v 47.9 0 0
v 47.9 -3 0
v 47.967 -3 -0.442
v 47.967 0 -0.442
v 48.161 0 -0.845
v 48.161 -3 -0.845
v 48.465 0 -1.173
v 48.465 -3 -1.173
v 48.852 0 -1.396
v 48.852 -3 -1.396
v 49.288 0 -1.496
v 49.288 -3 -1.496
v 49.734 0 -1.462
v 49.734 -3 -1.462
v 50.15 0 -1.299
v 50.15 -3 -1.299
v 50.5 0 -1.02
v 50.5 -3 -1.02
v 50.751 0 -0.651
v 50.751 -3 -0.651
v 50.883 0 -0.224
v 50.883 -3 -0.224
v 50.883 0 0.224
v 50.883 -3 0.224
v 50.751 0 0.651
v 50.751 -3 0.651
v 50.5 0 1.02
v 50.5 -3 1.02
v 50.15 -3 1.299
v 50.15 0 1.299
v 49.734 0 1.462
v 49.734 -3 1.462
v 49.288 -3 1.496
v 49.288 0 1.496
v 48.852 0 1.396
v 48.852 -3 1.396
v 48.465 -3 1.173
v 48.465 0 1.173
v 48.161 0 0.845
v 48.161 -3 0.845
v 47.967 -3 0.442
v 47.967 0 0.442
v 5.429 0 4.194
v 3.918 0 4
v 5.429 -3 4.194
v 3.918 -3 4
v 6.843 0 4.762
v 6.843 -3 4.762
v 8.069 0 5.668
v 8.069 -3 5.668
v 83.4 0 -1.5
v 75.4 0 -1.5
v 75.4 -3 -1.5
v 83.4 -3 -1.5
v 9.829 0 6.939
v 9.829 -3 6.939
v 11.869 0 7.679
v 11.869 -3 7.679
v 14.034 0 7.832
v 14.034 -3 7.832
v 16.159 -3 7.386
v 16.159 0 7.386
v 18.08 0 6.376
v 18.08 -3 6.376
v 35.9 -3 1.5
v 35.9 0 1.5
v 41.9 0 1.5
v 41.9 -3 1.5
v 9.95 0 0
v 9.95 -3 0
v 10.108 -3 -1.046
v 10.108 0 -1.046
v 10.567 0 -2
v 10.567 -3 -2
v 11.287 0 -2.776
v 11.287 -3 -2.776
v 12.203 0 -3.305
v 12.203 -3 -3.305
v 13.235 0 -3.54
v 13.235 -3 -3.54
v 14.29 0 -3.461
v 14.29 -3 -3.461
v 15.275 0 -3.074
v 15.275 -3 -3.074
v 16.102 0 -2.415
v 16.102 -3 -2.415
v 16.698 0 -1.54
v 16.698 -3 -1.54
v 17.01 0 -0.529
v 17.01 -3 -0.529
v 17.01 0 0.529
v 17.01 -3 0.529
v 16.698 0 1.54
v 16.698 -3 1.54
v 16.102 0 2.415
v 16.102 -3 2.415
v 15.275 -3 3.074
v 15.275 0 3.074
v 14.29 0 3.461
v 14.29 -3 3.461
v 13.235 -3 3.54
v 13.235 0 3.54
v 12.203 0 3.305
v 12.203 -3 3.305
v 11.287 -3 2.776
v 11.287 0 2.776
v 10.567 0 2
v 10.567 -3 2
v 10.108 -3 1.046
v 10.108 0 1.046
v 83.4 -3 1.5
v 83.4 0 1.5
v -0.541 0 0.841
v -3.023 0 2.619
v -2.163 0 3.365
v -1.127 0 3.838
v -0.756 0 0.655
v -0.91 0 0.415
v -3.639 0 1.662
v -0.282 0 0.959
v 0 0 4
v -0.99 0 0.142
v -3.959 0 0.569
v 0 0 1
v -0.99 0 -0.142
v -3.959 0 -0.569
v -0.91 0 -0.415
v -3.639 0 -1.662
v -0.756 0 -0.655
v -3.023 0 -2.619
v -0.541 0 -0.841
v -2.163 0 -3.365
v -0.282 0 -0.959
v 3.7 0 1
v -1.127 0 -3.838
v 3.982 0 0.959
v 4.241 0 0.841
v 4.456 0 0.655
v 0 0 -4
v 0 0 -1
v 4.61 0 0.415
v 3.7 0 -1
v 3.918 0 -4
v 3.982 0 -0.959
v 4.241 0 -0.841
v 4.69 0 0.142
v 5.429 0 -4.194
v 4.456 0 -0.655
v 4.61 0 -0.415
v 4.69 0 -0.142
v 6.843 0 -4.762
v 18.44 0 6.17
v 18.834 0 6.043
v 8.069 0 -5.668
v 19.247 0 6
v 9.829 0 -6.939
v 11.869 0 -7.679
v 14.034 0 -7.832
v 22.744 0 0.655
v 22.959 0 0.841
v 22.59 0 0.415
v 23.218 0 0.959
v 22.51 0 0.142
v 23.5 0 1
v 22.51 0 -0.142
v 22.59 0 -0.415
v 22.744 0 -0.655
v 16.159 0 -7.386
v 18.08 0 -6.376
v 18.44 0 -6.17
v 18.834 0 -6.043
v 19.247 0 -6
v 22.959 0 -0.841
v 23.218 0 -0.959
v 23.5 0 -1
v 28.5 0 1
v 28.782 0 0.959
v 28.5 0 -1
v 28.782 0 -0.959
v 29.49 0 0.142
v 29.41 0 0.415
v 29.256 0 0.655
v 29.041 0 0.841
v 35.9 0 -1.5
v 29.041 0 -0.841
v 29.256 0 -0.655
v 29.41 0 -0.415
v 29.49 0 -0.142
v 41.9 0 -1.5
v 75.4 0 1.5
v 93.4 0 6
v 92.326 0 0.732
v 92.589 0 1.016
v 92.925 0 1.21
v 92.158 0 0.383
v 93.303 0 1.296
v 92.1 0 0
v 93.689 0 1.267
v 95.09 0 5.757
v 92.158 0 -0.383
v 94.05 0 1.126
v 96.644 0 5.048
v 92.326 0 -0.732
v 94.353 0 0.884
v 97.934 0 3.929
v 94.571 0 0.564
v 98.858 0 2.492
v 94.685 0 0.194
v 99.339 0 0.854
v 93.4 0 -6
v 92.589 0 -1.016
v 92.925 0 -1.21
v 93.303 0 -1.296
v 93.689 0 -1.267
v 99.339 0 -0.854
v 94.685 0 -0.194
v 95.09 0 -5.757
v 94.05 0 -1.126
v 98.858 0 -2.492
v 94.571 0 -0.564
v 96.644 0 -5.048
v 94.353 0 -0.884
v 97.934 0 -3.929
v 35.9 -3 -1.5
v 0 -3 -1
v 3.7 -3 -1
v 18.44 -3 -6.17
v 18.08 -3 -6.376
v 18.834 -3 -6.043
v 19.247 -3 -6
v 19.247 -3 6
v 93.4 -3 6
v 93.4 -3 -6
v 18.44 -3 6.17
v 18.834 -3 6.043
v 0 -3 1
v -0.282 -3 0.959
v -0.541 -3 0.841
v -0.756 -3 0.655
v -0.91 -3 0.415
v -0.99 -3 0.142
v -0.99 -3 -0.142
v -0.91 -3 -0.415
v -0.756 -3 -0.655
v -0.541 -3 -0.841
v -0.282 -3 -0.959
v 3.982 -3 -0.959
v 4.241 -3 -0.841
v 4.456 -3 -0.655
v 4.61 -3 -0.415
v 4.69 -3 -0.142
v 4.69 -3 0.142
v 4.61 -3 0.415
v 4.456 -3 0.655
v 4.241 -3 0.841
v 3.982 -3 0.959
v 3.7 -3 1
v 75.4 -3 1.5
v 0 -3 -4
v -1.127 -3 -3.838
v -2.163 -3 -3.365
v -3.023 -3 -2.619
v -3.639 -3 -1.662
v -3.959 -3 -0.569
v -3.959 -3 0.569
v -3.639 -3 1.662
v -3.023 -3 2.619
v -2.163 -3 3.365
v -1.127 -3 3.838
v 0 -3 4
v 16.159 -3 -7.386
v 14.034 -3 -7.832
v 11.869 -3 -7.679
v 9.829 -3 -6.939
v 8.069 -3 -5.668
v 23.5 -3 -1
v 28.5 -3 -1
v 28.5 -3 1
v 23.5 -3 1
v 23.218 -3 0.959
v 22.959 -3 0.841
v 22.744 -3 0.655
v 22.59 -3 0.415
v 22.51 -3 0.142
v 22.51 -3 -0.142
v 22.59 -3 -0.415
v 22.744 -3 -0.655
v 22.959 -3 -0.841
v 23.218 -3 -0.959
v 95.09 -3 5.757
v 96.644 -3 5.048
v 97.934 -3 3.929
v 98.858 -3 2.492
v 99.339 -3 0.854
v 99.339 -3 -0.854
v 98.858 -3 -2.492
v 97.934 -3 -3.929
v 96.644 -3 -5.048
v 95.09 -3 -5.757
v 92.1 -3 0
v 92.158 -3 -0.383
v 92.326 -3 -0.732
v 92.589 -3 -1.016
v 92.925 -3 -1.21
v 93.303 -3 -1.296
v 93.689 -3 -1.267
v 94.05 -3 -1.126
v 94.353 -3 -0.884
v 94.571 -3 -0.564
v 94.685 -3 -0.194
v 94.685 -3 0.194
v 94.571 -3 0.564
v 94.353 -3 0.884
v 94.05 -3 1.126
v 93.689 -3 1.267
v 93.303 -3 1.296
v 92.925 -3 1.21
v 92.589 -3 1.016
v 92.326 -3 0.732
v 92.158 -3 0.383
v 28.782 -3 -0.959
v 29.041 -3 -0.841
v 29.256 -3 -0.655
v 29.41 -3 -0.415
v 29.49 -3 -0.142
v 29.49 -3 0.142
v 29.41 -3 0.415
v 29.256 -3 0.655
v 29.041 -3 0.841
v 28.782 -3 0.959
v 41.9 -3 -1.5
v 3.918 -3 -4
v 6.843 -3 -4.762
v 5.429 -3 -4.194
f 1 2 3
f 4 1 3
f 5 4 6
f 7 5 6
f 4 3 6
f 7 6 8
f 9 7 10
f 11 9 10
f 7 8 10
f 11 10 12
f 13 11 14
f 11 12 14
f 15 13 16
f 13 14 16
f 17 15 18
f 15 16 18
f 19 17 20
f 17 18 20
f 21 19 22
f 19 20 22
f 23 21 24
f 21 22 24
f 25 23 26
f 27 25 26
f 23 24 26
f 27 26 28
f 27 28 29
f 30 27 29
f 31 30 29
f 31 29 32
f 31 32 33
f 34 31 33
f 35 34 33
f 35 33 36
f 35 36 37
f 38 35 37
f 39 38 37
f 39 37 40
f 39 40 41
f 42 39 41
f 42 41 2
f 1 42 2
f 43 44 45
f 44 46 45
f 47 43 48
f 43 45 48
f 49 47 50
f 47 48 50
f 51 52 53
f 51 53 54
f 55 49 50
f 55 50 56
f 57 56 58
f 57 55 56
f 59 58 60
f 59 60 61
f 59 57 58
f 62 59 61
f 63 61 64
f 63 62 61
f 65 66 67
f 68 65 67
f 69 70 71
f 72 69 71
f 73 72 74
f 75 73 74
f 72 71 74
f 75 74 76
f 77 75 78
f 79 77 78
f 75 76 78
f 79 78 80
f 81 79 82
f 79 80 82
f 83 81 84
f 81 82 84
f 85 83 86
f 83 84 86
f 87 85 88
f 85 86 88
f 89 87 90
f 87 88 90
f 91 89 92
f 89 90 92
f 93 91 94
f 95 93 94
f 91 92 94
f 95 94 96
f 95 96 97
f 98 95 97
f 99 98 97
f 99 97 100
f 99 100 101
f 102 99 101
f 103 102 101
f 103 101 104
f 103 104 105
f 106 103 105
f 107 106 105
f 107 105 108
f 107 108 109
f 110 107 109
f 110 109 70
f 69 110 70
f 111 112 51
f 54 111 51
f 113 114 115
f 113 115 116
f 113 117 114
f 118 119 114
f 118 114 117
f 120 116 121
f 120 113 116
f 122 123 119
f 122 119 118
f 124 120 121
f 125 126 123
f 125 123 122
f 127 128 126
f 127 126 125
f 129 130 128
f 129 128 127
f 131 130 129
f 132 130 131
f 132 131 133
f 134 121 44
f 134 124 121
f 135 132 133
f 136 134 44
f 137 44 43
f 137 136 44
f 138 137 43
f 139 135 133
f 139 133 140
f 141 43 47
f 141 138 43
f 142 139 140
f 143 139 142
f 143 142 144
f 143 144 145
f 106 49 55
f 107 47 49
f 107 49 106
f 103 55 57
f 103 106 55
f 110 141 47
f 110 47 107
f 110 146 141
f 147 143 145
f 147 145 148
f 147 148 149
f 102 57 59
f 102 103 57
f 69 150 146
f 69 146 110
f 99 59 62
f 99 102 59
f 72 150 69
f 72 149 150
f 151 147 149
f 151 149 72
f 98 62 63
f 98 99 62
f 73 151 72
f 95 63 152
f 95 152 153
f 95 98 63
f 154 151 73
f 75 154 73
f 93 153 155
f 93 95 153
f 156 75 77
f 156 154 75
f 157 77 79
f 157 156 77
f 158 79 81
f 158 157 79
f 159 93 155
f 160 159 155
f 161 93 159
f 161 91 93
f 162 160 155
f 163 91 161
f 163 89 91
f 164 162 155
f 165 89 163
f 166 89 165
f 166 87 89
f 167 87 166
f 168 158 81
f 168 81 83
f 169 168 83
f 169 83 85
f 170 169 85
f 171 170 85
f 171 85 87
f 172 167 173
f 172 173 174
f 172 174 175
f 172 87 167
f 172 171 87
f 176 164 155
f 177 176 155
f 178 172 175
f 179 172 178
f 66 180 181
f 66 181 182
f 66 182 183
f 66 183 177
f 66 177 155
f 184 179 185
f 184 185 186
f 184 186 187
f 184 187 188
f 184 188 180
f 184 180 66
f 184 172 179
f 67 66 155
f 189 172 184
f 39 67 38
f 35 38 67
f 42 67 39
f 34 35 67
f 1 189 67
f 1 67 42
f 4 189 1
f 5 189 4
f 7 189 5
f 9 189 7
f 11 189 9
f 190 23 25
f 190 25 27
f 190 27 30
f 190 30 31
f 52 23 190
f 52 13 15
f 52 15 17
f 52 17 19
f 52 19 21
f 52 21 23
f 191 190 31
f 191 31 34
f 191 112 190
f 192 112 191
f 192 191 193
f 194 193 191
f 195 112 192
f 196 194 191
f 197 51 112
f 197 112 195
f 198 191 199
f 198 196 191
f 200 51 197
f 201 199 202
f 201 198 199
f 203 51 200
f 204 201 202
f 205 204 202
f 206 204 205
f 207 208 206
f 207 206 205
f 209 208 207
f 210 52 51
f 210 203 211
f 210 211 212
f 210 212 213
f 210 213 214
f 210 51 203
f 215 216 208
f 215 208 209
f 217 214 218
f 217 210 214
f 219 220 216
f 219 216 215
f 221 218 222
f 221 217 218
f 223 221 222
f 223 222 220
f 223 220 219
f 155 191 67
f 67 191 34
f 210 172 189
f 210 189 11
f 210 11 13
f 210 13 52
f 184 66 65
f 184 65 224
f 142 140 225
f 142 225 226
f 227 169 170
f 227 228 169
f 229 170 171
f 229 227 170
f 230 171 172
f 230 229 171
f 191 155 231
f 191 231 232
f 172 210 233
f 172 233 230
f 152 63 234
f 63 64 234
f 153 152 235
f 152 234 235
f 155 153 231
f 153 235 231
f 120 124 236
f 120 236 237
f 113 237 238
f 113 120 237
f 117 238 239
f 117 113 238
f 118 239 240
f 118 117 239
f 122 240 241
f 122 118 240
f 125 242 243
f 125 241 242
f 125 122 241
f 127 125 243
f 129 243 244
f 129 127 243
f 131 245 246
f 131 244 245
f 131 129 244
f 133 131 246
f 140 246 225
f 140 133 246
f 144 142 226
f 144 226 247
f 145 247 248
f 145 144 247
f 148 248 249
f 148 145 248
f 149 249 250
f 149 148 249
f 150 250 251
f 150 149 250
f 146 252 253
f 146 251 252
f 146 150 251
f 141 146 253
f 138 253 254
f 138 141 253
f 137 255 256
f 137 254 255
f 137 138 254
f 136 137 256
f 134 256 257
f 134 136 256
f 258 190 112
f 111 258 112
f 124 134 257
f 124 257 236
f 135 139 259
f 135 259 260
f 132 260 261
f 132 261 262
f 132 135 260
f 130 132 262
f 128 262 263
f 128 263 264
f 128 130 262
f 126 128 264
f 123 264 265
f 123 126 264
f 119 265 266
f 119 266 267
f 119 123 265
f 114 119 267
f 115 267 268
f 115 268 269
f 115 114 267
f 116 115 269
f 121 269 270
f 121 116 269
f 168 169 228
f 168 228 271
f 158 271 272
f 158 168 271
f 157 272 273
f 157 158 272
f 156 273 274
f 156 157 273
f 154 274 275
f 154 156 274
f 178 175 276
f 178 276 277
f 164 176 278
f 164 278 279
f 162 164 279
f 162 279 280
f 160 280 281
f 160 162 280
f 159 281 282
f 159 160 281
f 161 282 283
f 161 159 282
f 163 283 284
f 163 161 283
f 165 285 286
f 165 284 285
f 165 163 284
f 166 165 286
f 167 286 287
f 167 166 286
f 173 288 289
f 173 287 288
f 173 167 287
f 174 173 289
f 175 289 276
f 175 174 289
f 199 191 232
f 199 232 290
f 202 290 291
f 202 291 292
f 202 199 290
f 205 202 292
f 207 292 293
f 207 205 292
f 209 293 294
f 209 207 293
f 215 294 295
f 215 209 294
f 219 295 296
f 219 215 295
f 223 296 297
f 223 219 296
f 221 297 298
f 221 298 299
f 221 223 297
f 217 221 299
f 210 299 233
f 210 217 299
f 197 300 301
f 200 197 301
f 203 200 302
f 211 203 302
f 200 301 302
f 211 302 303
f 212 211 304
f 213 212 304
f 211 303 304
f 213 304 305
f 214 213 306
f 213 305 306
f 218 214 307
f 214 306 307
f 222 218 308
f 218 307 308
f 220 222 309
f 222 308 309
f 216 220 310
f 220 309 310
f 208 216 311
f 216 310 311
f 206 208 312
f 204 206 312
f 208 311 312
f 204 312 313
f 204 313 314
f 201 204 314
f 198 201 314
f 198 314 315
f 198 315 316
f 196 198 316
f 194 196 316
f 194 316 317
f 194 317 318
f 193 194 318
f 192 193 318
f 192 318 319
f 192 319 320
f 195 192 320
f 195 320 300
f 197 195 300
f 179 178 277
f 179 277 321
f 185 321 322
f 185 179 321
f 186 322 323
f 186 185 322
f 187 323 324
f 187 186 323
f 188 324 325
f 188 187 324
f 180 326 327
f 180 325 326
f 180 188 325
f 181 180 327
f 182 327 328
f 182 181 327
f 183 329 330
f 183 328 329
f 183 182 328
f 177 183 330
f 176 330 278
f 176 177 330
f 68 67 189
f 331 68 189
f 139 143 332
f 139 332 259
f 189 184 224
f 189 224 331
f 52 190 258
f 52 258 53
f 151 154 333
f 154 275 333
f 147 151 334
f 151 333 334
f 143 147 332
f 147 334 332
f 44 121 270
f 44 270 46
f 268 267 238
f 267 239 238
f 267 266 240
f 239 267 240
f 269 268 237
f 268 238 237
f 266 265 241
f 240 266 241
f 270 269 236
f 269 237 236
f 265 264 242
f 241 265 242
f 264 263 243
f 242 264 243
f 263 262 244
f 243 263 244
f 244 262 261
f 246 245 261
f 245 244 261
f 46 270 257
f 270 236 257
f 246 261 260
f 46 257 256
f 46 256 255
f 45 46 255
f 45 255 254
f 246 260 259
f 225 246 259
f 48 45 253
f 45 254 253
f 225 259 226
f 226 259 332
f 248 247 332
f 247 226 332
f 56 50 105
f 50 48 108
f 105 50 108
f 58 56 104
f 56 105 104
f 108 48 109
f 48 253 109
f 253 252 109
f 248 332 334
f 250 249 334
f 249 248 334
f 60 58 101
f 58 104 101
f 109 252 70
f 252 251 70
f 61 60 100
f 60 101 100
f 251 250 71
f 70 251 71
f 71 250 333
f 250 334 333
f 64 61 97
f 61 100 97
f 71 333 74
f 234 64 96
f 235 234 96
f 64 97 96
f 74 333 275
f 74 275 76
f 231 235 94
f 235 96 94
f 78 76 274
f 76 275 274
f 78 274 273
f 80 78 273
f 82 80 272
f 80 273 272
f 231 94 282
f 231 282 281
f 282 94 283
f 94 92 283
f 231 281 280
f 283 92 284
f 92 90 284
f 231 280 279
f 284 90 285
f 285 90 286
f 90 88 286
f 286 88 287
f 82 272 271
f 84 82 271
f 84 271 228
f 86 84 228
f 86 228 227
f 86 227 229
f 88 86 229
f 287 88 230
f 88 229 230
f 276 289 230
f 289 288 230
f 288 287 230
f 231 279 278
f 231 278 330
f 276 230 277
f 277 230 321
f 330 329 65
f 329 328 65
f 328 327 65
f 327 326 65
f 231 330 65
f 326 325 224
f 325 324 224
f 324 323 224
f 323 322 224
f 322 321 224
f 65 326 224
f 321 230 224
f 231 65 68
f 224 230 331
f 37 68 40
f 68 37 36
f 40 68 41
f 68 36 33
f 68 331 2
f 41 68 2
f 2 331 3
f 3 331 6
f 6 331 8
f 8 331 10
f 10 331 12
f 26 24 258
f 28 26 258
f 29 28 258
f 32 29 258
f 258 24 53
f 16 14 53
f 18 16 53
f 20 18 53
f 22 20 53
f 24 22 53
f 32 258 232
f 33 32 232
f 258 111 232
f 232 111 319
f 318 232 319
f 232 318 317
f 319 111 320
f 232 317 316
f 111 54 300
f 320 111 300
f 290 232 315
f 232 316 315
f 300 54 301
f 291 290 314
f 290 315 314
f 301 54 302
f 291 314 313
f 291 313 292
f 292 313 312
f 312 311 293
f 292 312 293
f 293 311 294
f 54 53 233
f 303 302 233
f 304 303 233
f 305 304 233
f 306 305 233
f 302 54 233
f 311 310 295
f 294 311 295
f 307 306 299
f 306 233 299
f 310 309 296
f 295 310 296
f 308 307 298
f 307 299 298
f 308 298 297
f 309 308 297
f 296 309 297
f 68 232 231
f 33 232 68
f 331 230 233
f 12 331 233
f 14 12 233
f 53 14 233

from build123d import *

# Parameters (mm, degrees)
ESBO_O1_R                    = 4
ESBO_O1_R_2                  = 7.85
ESBO_O1_R_3                  = 6
RESSALTO_EXTRUS_O1_DEPTH     = 3
FURO_DE_DI_METRO_7_1_7_1_1_D = 7.1
CORTE_EXTRUS_O1_DEPTH        = 100.754611422
ESBO_O3_W                    = 8
ESBO_O3_H                    = 3
ESBO_O3_W_2                  = 6
CORTE_EXTRUS_O2_DEPTH        = 100.754611422
FURO_DE_DI_METRO_2_6_2_6_1_D = 2.6
FURO_DE_DI_METRO_3_0_3_1_D   = 3
FILETE1_R                    = 2
FILETE2_R                    = 6


with BuildPart() as part:
    # Esboço1 → Ressalto-extrusão1 (new body)
    with BuildSketch(Plane(origin=(0, 0, 0), x_dir=(1, 0, 0), z_dir=(0, 1, 0))):
        Circle(ESBO_O1_R)
        with BuildLine():
            ThreePointArc((6.745557018, -4), (5.65, 0), (6.745557018, 4))
            Line((6.745557018, 4), (0, 4))
            ThreePointArc((0, 4), (2.828427125, 2.828427125), (4, 0))
            ThreePointArc((4, 0), (2.828427125, -2.828427125), (0, -4))
            Line((0, -4), (6.745557018, -4))
        make_face()
        with Locations((13.5, 0)):
            Circle(ESBO_O1_R_2)
        with BuildLine():
            ThreePointArc((93.4, -6), (87.4, 0), (93.4, 6))
            Line((93.4, 6), (18.561867244, 6))
            ThreePointArc((18.561867244, 6), (20.618924001, 3.308084199), (21.35, 0))
            ThreePointArc((21.35, 0), (20.618924001, -3.308084199), (18.561867244, -6))
            Line((18.561867244, -6), (93.4, -6))
        make_face()
        with Locations((93.4, 0)):
            Circle(ESBO_O1_R_3)
    extrude(amount=-RESSALTO_EXTRUS_O1_DEPTH)

    # Furo de diâmetro Ø7.1 (7.1)1 (through all)
    with Locations(Plane(origin=(0, 0, 0), x_dir=(1, 0, 0), z_dir=(0, 1, 0))):
        with Locations((13.5, 0)):
            Hole(FURO_DE_DI_METRO_7_1_7_1_1_D / 2)

    # Esboço2 → Corte-extrusão1 (cut, through all)
    with BuildSketch(Plane(origin=(0, 0, 0), x_dir=(1, 0, 0), z_dir=(0, 1, 0))):
        with BuildLine():
            Line((0, 1), (3.7, 1))
            ThreePointArc((3.7, 1), (4.7, 0), (3.7, -1))
            Line((3.7, -1), (0, -1))
            ThreePointArc((0, -1), (-1, 0), (0, 1))
        make_face()
        with BuildLine():
            Line((23.5, 1), (28.5, 1))
            ThreePointArc((28.5, 1), (29.5, 0), (28.5, -1))
            Line((28.5, -1), (23.5, -1))
            ThreePointArc((23.5, -1), (22.5, 0), (23.5, 1))
        make_face()
    extrude(amount=-CORTE_EXTRUS_O1_DEPTH, mode=Mode.SUBTRACT)

    # Esboço3 → Corte-extrusão2 (cut, through all)
    with BuildSketch(Plane(origin=(0, 0, 0), x_dir=(1, 0, 0), z_dir=(0, 1, 0))):
        with Locations((79.4, 0)):
            Rectangle(ESBO_O3_W, ESBO_O3_H)
        with Locations((38.9, 0)):
            Rectangle(ESBO_O3_W_2, ESBO_O3_H)
    extrude(amount=-CORTE_EXTRUS_O2_DEPTH, mode=Mode.SUBTRACT)

    # Furo de diâmetro Ø2.6 (2.6)1 (through all)
    with Locations(Plane(origin=(0, 0, 0), x_dir=(1, 0, 0), z_dir=(0, 1, 0))):
        with Locations((93.4, 0)):
            Hole(FURO_DE_DI_METRO_2_6_2_6_1_D / 2)

    # Furo de diâmetro Ø3.0 (3)1 (through all)
    with Locations(Plane(origin=(0, 0, 0), x_dir=(1, 0, 0), z_dir=(0, 1, 0))):
        with Locations((49.4, 0)):
            Hole(FURO_DE_DI_METRO_3_0_3_1_D / 2)

    # Filete1
    filete1_edges = [part.edges().sort_by_distance(p)[0] for p in [
        (18.561867244, -1.5, -6),
        (18.561867244, -1.5, 6),
    ]]
    fillet(filete1_edges, radius=FILETE1_R)

    # Filete2
    filete2_edges = [part.edges().sort_by_distance(p)[0] for p in [
        (6.745557018, -1.5, -4),
        (6.745557018, -1.5, 4),
    ]]
    fillet(filete2_edges, radius=FILETE2_R)


solid = part.part
